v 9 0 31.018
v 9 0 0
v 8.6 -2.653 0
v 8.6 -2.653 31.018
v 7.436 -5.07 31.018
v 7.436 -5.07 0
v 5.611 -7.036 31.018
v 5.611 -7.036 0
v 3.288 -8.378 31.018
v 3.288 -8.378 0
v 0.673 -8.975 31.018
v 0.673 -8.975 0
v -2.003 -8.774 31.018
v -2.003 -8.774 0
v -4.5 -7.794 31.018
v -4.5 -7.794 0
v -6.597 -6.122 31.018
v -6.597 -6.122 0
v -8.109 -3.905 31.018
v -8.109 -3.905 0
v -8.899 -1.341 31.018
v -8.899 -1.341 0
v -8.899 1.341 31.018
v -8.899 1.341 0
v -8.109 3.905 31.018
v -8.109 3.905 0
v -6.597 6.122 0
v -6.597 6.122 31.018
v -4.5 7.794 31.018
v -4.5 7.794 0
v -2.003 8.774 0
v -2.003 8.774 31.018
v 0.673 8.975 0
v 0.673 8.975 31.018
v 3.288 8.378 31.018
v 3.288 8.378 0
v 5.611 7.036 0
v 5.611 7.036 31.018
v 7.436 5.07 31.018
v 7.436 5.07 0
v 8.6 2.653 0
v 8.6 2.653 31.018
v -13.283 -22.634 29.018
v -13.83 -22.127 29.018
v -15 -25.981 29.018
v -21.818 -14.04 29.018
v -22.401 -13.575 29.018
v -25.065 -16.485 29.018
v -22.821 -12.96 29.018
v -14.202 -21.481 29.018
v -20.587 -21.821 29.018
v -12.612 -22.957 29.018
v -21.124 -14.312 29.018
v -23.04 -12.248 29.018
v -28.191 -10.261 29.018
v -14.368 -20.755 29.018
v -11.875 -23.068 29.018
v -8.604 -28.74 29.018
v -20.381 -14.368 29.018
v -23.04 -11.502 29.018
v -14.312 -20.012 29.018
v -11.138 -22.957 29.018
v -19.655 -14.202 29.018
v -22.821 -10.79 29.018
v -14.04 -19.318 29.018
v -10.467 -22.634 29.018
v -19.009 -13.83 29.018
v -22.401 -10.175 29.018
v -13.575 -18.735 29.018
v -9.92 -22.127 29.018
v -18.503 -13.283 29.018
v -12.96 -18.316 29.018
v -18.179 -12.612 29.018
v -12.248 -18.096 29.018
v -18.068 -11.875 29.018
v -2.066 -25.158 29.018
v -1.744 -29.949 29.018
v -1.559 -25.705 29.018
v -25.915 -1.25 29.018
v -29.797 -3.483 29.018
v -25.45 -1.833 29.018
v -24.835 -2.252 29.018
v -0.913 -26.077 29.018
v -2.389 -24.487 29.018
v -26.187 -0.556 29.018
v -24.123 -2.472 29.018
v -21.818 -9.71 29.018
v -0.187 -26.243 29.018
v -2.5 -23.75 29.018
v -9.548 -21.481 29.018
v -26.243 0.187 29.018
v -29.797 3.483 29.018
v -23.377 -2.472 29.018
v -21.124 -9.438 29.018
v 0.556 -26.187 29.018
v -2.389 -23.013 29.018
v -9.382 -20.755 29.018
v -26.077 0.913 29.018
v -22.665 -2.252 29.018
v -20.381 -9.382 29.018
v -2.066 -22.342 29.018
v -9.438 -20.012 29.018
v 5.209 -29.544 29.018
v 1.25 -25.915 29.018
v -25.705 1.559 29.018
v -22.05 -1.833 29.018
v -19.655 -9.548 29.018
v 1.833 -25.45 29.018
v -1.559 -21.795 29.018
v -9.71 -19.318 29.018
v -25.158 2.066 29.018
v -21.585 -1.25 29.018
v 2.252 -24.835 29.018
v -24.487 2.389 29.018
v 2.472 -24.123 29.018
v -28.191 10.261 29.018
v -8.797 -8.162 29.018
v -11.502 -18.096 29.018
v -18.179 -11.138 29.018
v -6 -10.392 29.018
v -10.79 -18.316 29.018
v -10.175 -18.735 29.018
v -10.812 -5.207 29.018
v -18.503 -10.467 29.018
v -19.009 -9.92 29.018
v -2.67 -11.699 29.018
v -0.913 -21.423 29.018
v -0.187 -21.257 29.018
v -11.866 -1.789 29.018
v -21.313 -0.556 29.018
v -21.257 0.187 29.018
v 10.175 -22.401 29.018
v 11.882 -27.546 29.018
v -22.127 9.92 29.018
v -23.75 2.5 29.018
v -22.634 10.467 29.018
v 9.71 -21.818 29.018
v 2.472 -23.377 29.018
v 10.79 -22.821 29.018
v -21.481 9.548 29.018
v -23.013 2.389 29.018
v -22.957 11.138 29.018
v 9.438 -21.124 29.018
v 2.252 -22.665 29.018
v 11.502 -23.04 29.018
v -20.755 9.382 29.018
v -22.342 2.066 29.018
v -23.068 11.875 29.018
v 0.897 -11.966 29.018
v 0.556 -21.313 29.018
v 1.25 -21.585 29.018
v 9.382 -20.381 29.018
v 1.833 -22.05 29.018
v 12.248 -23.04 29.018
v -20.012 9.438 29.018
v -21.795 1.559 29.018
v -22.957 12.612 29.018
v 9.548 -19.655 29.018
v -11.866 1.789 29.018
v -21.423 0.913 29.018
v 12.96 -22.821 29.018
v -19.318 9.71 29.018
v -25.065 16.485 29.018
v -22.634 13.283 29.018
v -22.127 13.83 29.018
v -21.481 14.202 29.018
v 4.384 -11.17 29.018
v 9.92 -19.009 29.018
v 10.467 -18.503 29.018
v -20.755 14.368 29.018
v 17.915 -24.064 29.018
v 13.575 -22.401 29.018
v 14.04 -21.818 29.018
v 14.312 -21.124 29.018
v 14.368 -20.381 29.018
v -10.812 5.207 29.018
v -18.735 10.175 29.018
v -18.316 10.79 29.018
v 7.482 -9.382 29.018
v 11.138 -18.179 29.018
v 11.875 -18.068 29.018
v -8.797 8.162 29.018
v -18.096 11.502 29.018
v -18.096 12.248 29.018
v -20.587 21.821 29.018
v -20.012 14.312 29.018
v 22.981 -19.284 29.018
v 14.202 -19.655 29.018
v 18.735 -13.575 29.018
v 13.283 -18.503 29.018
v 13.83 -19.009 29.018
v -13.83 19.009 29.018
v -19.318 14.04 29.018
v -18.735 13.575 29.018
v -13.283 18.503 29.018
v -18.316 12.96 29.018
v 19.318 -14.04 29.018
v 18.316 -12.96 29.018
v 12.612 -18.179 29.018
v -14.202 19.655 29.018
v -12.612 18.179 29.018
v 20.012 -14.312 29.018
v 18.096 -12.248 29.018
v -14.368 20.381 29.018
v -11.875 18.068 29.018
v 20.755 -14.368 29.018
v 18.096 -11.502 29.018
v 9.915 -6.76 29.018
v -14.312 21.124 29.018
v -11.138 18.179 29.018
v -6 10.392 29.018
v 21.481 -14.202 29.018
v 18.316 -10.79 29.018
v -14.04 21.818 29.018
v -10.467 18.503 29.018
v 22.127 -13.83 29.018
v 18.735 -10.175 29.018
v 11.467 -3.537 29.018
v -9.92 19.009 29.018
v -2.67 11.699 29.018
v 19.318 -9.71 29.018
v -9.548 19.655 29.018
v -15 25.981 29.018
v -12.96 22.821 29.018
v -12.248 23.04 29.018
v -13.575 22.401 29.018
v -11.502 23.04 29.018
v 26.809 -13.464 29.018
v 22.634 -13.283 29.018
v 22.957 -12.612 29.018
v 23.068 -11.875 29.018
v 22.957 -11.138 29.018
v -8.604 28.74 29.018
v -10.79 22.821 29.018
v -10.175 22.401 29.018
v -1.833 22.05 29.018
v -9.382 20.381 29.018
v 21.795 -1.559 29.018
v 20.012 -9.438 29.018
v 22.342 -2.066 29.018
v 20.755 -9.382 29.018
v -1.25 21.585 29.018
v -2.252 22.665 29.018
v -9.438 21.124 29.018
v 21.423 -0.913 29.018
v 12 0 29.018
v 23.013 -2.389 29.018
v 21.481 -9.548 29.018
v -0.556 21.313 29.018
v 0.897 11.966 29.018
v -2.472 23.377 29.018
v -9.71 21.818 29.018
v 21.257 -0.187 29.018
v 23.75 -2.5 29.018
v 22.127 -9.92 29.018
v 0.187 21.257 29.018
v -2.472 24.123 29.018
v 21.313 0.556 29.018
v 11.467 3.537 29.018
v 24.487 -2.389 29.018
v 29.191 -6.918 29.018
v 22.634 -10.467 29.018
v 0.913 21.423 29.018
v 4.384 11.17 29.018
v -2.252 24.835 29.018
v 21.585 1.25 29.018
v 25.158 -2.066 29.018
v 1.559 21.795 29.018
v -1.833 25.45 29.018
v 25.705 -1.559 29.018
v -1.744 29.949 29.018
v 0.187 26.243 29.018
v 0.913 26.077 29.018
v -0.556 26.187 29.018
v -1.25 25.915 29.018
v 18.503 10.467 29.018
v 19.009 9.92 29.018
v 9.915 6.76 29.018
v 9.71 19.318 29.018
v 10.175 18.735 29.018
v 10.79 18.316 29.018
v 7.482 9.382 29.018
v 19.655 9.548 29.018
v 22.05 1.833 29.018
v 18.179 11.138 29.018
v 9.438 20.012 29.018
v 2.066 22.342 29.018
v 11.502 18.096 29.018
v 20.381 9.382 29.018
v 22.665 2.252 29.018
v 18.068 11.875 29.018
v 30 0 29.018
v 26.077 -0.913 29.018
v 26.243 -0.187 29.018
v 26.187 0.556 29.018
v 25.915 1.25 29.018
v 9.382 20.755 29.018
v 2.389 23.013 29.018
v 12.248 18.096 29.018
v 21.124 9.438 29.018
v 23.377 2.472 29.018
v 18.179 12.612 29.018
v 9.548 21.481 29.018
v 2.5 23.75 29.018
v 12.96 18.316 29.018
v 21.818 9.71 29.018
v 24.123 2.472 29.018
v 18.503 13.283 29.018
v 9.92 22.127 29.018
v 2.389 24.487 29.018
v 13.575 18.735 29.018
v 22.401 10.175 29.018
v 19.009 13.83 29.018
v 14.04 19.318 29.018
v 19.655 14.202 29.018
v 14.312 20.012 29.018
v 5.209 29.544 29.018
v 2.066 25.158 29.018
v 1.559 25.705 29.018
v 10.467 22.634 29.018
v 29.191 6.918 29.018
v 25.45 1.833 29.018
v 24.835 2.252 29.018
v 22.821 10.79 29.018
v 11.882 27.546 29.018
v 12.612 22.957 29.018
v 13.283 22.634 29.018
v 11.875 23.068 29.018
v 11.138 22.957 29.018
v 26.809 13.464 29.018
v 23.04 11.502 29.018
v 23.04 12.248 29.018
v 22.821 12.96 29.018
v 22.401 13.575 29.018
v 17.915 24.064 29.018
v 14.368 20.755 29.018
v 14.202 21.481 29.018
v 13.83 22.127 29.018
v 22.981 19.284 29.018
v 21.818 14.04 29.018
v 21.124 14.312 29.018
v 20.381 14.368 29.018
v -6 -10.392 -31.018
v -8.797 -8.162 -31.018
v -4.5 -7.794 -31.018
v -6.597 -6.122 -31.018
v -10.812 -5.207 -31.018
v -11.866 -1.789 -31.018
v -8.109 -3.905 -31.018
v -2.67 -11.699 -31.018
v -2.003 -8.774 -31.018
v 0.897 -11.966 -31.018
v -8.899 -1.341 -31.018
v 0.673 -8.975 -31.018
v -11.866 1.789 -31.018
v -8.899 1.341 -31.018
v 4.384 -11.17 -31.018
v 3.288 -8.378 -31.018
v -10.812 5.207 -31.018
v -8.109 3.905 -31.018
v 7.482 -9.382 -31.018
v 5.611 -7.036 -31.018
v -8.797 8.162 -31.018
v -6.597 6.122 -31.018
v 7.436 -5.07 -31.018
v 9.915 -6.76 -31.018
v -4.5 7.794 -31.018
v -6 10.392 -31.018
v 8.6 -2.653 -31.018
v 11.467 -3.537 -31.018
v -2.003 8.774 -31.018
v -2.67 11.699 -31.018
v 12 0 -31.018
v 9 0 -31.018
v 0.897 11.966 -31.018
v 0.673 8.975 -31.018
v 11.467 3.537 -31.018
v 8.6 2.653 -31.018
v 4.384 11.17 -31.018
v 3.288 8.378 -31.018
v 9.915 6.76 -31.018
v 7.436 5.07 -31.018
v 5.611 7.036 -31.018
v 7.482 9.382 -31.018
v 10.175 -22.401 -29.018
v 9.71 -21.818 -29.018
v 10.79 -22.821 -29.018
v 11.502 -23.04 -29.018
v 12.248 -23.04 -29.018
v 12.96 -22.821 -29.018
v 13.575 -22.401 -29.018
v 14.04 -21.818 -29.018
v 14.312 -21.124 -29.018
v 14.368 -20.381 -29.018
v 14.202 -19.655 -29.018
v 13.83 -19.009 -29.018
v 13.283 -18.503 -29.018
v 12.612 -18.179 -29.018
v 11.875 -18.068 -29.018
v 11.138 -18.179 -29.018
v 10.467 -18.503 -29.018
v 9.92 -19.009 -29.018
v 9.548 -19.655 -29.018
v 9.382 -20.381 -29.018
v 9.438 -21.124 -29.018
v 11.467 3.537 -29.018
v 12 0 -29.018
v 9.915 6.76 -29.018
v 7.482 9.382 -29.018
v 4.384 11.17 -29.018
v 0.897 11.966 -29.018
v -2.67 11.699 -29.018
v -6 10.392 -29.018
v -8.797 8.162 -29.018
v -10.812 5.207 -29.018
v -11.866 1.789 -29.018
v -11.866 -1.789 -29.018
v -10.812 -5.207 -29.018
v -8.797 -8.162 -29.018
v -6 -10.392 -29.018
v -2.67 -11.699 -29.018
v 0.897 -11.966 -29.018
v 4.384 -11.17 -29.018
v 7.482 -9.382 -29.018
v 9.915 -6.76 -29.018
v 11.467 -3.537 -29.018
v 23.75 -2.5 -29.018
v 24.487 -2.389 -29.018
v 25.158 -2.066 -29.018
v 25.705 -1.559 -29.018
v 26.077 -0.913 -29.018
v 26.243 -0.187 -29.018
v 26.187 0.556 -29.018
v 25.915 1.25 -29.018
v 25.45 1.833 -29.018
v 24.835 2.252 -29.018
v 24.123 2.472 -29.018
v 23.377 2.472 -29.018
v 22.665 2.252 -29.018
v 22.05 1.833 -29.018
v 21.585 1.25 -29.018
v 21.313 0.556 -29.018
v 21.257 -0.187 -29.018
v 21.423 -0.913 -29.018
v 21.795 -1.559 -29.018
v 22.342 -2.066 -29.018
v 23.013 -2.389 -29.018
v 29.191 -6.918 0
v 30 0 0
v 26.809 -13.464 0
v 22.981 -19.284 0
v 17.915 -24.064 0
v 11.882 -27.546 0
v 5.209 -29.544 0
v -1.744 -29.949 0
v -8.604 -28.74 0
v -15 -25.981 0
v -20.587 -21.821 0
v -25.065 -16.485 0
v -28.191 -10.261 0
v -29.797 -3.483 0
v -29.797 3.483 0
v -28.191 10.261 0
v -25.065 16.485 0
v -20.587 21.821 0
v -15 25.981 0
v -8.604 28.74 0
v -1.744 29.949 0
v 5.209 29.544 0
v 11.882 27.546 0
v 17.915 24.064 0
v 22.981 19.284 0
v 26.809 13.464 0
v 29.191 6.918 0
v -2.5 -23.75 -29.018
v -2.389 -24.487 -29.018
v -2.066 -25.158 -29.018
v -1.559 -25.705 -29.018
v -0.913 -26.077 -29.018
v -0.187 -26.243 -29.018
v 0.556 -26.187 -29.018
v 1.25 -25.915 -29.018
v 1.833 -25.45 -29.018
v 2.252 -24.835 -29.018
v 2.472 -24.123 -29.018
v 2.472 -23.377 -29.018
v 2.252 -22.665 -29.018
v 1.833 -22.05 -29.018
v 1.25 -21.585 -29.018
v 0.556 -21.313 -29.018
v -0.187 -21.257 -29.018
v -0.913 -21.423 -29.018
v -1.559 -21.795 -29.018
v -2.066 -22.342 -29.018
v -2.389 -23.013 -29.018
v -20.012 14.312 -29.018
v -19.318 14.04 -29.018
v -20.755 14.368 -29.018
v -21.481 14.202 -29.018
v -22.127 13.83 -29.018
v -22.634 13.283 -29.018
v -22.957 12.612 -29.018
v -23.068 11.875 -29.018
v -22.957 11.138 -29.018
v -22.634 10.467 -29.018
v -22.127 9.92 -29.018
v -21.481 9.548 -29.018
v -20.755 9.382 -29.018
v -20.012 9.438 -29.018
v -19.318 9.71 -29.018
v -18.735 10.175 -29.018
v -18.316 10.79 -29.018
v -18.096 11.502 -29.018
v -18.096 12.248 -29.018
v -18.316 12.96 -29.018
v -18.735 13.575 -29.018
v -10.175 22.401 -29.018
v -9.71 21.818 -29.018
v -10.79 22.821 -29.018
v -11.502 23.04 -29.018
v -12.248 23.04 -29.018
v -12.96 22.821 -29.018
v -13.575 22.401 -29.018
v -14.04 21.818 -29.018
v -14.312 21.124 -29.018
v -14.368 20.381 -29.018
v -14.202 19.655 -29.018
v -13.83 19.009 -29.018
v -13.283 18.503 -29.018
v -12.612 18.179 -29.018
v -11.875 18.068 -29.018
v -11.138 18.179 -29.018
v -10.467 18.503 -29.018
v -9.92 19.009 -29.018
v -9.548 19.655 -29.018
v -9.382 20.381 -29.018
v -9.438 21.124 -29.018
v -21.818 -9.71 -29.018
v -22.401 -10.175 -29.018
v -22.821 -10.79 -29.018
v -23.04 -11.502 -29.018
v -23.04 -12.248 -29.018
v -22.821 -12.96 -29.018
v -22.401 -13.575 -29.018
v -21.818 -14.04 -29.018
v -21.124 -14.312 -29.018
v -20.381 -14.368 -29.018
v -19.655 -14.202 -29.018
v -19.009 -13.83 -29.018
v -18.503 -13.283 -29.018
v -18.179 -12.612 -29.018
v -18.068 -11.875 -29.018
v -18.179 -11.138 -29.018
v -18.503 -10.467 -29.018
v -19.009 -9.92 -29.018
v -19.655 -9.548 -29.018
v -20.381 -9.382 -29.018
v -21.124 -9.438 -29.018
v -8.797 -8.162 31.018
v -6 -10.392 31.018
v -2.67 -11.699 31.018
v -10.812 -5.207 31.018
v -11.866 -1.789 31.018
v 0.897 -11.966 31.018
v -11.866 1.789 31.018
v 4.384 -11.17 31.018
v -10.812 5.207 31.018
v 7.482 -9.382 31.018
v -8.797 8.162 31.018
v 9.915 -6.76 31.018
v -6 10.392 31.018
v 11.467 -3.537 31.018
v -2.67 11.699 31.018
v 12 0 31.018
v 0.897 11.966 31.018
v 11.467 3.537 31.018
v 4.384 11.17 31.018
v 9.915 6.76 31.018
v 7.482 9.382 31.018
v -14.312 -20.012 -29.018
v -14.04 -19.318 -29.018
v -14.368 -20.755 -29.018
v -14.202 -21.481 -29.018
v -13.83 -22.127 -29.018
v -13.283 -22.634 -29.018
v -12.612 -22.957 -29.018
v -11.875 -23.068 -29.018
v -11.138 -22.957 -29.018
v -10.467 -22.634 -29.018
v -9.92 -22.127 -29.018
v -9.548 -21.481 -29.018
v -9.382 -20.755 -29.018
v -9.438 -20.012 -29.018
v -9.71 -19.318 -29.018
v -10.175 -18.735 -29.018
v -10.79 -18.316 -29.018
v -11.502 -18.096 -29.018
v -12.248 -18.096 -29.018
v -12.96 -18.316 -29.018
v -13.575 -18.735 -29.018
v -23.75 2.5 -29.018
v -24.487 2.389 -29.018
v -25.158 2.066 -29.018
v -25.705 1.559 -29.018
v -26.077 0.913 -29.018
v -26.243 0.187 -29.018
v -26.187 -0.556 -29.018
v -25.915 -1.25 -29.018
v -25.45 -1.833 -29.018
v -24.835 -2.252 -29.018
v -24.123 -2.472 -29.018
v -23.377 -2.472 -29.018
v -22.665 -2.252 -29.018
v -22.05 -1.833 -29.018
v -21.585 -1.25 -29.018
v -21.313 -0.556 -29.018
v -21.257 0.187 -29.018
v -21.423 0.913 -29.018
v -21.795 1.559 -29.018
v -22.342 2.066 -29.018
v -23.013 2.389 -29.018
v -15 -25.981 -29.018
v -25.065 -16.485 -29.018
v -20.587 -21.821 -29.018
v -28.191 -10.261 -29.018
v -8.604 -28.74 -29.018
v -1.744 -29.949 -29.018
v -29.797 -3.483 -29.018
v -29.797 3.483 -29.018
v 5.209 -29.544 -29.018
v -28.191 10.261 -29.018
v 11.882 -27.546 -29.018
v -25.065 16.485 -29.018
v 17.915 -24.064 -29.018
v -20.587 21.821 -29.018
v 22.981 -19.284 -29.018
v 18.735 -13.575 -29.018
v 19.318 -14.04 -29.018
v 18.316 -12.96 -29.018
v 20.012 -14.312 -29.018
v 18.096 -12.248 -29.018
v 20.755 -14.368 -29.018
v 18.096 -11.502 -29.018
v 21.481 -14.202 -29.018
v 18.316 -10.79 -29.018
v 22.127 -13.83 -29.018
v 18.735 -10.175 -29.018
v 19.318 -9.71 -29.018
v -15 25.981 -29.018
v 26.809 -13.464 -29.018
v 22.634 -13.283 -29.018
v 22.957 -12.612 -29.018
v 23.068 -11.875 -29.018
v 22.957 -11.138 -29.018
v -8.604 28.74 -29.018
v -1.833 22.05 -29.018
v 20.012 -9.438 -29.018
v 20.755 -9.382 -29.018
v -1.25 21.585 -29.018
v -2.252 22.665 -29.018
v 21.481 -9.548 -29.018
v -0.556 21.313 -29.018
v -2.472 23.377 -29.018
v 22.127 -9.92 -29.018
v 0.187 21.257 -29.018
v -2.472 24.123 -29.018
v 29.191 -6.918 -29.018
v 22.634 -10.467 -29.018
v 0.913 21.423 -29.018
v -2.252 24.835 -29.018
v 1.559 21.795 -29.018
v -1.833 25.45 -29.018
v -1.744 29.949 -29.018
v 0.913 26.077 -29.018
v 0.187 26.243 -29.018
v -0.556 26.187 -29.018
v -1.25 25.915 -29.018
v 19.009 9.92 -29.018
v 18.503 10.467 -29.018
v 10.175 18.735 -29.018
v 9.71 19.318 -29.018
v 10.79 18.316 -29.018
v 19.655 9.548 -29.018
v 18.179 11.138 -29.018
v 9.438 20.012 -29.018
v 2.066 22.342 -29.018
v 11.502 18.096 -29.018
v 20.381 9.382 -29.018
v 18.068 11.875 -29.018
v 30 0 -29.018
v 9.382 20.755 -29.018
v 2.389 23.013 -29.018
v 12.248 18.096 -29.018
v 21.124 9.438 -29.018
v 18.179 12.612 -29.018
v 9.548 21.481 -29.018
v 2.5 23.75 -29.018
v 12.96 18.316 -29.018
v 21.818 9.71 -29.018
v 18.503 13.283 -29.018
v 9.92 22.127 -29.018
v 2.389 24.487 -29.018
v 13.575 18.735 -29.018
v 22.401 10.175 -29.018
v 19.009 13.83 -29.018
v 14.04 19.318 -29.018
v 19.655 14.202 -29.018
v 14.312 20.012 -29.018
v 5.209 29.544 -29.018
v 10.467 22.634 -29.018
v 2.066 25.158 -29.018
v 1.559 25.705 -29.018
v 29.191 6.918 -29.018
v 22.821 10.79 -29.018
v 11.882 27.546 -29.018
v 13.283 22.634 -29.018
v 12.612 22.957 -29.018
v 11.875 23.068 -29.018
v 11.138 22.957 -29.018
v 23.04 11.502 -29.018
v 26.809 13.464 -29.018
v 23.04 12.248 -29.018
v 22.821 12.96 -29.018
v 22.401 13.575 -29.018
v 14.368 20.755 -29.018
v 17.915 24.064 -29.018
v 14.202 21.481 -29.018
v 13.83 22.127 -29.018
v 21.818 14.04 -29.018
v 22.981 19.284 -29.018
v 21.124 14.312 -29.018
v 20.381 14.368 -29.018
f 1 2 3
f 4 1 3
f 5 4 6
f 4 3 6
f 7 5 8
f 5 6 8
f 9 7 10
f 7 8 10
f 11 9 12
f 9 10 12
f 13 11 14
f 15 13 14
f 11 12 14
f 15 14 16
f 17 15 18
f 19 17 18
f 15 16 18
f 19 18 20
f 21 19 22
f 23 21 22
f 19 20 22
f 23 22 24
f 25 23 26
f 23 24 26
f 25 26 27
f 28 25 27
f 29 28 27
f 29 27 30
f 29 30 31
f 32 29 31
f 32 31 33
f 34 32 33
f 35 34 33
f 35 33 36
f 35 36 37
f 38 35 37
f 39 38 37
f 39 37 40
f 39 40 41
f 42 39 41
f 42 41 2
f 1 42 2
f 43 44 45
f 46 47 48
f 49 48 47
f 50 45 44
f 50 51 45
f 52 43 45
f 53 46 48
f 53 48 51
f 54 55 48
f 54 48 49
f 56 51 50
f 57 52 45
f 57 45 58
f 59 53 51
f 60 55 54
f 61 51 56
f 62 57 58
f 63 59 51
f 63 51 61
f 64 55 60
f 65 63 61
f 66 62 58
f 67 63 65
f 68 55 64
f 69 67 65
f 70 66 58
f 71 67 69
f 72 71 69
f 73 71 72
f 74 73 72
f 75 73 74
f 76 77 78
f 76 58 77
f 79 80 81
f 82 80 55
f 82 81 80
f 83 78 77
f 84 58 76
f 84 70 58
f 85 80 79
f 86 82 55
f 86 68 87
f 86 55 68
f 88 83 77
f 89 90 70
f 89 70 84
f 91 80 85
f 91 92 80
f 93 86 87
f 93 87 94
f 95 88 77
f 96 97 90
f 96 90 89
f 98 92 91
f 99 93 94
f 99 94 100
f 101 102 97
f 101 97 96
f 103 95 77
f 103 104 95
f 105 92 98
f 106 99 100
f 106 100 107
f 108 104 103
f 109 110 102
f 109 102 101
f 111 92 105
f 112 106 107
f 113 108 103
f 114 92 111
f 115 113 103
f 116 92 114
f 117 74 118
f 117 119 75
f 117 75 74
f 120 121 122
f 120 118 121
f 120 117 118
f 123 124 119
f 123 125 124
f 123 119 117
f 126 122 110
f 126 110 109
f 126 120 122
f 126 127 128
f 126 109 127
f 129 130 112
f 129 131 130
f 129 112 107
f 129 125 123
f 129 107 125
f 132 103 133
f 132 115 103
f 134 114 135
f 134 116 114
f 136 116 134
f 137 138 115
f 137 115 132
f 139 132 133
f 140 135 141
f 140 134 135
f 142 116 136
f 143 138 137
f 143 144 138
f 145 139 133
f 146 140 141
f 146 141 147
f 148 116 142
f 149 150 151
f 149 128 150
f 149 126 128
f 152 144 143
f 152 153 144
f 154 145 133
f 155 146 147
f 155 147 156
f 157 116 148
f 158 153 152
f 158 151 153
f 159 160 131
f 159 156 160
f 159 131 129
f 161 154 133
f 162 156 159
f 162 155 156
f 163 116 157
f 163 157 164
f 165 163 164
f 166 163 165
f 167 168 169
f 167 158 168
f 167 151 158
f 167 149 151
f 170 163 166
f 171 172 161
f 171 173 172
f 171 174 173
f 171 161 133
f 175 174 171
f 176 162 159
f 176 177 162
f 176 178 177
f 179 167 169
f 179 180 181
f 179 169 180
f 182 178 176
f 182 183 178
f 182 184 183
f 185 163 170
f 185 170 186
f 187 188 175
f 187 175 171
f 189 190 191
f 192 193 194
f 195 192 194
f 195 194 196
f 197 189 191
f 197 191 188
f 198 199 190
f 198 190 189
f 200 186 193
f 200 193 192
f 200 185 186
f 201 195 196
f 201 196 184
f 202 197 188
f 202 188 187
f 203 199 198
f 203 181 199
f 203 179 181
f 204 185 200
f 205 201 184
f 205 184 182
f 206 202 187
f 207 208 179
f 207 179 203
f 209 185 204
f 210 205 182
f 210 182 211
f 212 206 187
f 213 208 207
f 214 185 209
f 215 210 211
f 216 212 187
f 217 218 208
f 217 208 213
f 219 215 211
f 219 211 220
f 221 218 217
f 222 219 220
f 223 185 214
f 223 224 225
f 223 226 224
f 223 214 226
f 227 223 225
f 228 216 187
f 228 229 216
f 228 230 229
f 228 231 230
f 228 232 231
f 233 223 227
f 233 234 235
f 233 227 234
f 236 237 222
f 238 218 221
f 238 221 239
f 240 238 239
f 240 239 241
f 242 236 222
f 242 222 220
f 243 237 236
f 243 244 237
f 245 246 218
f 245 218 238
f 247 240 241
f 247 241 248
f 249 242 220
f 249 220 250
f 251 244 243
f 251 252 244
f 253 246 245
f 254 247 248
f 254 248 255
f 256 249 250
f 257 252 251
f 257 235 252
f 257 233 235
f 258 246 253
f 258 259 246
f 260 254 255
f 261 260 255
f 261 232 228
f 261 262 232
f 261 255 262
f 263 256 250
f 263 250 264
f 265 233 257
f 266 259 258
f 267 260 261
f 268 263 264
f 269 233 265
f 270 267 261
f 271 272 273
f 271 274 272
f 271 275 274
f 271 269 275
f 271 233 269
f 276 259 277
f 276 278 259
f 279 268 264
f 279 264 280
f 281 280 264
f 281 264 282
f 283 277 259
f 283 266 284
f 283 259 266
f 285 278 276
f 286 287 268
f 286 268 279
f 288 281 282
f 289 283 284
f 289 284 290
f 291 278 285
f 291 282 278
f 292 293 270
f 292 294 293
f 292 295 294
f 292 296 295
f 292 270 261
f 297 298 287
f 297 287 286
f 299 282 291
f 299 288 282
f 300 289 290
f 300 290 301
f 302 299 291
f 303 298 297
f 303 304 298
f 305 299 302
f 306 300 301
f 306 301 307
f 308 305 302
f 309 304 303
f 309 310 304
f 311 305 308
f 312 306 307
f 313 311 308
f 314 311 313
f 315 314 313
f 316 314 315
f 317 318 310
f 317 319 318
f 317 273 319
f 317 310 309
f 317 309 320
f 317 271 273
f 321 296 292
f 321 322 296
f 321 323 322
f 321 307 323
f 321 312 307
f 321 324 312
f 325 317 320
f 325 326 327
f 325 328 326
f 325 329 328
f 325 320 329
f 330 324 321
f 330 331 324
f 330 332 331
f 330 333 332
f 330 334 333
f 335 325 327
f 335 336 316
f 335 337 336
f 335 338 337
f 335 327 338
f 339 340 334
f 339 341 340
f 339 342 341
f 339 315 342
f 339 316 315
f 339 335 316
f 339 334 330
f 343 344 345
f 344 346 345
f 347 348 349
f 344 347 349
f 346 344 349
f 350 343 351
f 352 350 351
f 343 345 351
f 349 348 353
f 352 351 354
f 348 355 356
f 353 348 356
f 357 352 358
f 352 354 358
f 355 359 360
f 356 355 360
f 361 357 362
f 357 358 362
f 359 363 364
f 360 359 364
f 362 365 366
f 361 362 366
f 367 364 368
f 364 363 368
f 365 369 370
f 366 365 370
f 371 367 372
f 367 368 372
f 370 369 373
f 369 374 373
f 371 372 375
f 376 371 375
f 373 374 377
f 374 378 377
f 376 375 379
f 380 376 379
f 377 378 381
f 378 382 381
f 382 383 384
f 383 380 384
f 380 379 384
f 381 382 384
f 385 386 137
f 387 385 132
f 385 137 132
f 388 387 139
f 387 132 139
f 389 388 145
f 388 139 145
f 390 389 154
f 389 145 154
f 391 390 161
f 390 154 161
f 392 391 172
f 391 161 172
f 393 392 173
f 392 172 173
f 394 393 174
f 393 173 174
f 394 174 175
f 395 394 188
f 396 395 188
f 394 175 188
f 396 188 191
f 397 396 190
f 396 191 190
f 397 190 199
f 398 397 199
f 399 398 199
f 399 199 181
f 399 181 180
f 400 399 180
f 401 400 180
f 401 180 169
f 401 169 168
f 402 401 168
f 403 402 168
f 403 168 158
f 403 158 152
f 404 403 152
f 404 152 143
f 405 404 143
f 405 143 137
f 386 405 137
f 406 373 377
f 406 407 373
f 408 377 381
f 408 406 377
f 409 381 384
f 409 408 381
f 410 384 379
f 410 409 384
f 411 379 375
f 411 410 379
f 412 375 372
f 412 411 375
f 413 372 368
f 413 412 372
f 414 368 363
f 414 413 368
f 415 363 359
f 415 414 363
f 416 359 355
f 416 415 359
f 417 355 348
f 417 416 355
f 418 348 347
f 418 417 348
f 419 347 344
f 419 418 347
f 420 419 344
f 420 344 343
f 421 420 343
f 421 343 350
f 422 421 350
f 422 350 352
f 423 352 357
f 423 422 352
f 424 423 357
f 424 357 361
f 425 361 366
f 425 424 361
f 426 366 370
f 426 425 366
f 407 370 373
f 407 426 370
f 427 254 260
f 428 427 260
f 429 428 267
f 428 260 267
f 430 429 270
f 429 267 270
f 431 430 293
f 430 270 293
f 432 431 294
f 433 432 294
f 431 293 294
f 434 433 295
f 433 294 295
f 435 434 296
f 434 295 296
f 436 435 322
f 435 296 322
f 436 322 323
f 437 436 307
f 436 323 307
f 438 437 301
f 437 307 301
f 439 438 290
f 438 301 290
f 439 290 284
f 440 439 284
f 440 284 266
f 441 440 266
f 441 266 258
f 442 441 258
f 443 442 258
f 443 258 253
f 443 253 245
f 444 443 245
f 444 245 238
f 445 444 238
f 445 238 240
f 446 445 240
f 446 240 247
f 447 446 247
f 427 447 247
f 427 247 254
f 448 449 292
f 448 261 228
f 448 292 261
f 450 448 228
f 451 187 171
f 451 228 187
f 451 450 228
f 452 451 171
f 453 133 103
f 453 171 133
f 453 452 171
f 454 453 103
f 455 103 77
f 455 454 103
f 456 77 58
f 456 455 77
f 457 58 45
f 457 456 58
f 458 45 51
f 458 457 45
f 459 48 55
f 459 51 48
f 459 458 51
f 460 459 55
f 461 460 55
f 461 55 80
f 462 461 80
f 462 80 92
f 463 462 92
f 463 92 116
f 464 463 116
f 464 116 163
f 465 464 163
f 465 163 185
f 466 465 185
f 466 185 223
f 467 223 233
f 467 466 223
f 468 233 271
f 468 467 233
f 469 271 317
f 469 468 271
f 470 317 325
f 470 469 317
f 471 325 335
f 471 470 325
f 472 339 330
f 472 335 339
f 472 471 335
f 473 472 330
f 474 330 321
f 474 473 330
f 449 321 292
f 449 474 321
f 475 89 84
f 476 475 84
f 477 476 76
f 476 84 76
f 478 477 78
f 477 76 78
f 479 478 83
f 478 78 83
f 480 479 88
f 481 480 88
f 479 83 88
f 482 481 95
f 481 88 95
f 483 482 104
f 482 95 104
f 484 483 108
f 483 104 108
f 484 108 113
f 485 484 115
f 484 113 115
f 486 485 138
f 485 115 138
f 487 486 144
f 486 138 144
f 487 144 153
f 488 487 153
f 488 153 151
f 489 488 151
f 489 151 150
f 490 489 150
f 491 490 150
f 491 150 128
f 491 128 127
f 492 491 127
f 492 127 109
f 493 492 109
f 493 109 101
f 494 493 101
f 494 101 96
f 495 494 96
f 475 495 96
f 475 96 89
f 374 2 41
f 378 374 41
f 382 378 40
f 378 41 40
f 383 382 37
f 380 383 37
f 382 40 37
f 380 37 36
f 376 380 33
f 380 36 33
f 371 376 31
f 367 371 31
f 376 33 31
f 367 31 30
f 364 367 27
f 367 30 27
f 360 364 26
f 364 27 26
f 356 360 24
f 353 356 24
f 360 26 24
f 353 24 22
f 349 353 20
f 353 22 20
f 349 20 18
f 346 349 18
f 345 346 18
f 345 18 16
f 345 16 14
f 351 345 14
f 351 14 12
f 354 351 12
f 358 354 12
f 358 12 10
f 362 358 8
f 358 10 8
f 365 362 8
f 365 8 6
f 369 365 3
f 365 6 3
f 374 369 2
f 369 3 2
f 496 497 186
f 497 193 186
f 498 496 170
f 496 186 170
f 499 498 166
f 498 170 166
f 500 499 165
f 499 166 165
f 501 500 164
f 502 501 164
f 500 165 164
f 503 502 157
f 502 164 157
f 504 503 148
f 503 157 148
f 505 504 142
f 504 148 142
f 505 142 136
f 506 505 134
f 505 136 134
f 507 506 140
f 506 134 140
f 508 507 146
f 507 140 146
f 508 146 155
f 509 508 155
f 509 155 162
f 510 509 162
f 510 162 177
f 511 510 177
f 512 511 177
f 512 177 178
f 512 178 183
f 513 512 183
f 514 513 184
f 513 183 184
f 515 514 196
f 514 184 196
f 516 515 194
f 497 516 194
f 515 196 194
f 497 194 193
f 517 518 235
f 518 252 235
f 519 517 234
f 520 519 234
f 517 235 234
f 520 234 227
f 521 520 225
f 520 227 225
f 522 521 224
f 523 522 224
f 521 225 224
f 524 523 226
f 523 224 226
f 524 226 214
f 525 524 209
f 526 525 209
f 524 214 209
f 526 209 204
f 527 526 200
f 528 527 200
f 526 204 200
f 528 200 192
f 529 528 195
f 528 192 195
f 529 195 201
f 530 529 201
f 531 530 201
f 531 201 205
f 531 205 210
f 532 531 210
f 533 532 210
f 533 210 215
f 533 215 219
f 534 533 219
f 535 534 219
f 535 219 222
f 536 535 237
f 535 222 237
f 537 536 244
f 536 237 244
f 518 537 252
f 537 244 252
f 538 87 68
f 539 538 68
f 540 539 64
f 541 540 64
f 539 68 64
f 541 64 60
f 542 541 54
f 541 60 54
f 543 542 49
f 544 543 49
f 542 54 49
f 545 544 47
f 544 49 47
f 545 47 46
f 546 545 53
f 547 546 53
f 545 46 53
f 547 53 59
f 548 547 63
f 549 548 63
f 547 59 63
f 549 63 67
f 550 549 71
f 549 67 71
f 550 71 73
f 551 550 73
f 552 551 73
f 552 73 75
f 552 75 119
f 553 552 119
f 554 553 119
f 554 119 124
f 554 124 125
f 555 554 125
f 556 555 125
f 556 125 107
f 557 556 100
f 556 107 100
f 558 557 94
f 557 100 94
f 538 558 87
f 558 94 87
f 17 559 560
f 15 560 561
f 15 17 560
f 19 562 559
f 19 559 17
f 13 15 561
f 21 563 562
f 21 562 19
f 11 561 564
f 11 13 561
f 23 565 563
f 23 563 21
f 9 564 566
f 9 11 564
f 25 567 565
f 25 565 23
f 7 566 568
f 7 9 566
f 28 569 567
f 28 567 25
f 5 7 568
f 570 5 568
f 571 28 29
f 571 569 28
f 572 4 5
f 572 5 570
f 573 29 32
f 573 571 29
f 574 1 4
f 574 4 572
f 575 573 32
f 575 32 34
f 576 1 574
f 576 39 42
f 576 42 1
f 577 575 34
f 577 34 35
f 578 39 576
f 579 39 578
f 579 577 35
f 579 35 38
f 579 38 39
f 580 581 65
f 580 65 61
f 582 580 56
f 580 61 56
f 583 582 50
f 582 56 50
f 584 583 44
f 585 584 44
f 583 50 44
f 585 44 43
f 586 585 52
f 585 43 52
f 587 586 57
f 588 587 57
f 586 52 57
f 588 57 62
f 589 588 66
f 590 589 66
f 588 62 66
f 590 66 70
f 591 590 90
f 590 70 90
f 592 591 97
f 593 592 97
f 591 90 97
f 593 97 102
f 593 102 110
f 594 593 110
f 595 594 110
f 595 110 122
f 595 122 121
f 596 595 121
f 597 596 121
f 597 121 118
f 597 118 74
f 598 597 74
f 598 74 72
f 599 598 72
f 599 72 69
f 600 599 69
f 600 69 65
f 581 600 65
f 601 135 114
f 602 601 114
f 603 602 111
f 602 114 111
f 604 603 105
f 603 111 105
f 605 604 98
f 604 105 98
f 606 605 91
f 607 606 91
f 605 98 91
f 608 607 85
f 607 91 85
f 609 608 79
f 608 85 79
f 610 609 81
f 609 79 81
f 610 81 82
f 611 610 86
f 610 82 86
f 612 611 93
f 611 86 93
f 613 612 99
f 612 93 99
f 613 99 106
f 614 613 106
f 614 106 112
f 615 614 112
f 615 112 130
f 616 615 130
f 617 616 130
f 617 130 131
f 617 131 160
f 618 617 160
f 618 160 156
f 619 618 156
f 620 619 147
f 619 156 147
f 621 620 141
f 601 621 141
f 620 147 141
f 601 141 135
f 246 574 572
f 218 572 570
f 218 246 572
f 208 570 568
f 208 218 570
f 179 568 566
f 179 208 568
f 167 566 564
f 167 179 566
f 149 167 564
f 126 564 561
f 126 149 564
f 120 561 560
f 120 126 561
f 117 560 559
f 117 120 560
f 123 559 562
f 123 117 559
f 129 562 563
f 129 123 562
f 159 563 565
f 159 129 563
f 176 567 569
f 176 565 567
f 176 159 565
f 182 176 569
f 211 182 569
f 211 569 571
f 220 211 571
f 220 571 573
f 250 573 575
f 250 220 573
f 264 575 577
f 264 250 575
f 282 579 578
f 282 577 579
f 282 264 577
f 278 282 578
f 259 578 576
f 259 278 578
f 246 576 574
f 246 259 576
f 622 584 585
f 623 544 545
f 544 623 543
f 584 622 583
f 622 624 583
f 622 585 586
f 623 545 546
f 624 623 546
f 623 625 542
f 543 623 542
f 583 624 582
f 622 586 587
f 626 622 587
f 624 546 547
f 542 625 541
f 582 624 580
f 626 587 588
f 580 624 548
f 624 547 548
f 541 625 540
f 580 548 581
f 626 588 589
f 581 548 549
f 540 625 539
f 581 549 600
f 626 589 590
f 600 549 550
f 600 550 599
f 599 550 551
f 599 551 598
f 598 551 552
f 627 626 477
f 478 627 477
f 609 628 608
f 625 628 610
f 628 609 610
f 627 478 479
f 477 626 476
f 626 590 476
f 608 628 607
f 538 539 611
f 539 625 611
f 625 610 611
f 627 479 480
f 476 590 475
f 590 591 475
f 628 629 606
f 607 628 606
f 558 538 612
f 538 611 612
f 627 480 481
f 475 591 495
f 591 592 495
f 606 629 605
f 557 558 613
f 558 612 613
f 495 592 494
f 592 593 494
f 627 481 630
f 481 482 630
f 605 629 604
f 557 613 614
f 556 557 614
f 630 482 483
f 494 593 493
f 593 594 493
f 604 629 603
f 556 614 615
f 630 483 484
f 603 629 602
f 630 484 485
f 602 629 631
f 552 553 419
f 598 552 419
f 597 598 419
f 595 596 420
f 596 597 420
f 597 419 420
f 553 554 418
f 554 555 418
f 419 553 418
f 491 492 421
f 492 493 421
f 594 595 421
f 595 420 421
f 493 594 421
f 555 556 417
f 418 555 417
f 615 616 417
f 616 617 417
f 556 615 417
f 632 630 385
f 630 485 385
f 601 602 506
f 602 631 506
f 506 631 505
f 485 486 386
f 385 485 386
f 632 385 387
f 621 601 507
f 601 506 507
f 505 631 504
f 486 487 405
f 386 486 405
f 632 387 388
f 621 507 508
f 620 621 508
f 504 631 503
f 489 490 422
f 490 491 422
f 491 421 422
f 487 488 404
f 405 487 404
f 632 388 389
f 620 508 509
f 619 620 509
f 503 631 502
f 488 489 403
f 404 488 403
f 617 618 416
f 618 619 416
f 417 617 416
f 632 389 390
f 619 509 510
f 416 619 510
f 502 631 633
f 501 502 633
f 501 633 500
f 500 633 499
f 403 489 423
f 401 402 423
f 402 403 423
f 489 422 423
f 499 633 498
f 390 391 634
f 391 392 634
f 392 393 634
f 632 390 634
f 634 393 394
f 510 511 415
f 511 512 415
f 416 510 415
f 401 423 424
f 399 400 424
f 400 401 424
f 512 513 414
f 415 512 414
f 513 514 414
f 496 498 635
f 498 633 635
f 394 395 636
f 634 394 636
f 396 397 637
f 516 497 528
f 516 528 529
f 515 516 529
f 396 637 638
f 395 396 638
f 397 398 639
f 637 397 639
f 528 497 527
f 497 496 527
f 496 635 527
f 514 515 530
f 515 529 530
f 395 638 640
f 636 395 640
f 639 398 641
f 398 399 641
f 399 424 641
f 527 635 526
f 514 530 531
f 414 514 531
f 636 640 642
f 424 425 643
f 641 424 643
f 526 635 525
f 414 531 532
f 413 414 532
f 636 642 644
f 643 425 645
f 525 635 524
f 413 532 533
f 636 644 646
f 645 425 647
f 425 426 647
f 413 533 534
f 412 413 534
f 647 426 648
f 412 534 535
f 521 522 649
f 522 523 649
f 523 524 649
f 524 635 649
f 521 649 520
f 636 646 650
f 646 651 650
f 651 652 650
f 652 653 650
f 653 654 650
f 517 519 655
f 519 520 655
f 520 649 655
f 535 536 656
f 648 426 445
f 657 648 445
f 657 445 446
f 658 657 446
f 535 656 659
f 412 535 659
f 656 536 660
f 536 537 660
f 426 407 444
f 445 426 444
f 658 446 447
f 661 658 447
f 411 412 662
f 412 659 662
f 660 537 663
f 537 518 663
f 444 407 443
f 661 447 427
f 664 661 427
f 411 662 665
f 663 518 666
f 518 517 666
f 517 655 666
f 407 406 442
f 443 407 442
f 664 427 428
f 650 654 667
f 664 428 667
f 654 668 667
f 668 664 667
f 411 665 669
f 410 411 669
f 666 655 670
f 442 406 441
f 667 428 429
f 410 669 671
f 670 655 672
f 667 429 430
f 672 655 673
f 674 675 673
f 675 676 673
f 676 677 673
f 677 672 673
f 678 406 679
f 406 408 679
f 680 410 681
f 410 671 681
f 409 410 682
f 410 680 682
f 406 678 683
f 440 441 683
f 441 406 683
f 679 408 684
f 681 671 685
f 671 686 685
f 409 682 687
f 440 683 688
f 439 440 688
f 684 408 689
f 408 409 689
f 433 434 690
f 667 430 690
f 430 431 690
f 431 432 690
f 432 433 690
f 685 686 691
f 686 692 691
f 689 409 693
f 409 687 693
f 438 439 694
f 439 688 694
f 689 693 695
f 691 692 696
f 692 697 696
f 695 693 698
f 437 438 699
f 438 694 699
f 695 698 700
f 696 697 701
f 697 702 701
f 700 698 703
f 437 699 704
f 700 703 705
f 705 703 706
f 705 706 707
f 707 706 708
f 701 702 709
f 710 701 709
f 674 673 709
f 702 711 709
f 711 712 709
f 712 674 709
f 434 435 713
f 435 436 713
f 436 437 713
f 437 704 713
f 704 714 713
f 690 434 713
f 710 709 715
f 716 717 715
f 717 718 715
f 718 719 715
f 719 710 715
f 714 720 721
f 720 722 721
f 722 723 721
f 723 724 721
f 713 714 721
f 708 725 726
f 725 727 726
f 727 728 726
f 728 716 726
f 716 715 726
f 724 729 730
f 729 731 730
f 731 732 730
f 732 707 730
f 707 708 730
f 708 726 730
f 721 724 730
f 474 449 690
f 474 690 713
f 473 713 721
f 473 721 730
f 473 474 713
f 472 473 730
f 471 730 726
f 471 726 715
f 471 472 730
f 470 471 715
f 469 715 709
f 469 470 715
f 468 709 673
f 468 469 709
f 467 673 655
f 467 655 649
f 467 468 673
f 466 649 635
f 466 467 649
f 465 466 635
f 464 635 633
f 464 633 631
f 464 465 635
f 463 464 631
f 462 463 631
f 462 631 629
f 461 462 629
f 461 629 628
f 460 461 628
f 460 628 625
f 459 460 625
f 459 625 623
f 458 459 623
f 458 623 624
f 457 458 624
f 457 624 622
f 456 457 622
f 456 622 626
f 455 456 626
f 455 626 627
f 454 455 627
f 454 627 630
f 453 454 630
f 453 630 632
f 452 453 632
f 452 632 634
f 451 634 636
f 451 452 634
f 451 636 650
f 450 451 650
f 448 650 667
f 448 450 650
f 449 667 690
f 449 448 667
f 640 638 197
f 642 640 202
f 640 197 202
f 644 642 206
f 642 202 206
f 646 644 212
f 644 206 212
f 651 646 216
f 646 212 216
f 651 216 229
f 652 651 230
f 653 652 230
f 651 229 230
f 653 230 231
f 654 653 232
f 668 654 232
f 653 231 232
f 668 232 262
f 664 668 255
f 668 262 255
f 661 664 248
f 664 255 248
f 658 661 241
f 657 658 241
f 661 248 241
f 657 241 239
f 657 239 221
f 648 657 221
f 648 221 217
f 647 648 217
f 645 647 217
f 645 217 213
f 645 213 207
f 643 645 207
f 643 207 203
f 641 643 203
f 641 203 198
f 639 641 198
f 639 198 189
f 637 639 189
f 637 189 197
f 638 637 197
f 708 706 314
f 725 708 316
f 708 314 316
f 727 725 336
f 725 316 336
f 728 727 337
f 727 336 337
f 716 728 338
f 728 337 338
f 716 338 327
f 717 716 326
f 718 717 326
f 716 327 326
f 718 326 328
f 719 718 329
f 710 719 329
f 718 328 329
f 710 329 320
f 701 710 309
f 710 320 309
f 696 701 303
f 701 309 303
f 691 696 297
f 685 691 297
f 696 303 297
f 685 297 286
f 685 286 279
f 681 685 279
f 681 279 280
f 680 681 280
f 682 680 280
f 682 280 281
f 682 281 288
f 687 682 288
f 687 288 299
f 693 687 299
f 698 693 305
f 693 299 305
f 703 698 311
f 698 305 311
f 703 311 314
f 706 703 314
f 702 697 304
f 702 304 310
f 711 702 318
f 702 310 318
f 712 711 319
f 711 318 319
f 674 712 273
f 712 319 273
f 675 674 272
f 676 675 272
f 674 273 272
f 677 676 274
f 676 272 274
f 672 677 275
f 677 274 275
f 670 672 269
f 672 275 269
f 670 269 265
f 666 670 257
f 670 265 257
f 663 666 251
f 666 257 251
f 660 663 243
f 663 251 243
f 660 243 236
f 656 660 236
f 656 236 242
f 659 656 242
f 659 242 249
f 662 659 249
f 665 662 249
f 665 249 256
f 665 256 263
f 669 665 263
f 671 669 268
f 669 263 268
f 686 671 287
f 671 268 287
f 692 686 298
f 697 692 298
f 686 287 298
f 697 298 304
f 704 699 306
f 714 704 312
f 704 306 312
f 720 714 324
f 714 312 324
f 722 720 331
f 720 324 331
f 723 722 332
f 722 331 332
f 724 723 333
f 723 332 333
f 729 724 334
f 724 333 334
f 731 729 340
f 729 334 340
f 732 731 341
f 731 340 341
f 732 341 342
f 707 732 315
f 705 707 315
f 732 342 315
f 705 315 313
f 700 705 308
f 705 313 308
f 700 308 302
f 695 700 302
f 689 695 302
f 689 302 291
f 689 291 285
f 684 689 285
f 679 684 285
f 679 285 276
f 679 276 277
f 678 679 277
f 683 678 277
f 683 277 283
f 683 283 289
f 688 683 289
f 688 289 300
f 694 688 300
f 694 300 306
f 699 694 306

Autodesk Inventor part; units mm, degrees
ref_plane "YZ Plane" through (0, 0, 0) normal (1, 0, 0) x (0, 1, 0)
ref_plane "XZ Plane" through (0, 0, 0) normal (0, 1, 0) x (-1, 0, 0)
ref_plane "XY Plane" through (0, 0, 0) normal (0, 0, 1) x (1, 0, 0)
sketch "Sketch1" plane through (0, 0, 0) normal (0, 0, 1) x (1, 0, 0)
  circle A0 centre (0, 0) radius 30
  dimension "d0" = 60
extrude "Extrusion1" add sketch "Sketch1" along normal mid plane 58.037
sketch "Sketch2" plane through (0, 0, 0) normal (0, 0, 1) x (1, 0, 0)
  circle A0 centre (0, 0) radius 30 projected
  circle A1 centre (0, 0) radius 12
  dimension "d3" = 24
extrude "Extrusion2" add sketch "Sketch2" along normal mid plane 62.037 contours A1
sketch "Sketch3" plane through (0, 0, 0) normal (0, 0, 1) x (1, 0, 0)
  circle A0 centre (0, 0) radius 12 projected
  circle A1 centre (0, 0) radius 9
  dimension "d6" = 18
extrude "Extrusion3" cut sketch "Sketch3" along normal mid plane 94.75 contours A1
sketch "Sketch4" plane through (0, 0, 0) normal (0, 0, 1) x (1, 0, 0)
  circle A0 centre (0, 0) radius 23.75
  circle A1 centre (0, 23.75) radius 2.5
  dimension "d9" = 47.5
  dimension "d10" = 5
extrude "Extrusion4" cut sketch "Sketch4" along normal mid plane 127.5 contours A1 A0 | A0 A1 picked at (-0.0971, 22.9126) picked at (0.0803, 24.5697)
pattern_circular "Circular Pattern1" count 12 over 360 about axis through (0, 0, 0) along (0, 0, 1) of "Extrusion4"
properties part number "shaft" material "Steel"
